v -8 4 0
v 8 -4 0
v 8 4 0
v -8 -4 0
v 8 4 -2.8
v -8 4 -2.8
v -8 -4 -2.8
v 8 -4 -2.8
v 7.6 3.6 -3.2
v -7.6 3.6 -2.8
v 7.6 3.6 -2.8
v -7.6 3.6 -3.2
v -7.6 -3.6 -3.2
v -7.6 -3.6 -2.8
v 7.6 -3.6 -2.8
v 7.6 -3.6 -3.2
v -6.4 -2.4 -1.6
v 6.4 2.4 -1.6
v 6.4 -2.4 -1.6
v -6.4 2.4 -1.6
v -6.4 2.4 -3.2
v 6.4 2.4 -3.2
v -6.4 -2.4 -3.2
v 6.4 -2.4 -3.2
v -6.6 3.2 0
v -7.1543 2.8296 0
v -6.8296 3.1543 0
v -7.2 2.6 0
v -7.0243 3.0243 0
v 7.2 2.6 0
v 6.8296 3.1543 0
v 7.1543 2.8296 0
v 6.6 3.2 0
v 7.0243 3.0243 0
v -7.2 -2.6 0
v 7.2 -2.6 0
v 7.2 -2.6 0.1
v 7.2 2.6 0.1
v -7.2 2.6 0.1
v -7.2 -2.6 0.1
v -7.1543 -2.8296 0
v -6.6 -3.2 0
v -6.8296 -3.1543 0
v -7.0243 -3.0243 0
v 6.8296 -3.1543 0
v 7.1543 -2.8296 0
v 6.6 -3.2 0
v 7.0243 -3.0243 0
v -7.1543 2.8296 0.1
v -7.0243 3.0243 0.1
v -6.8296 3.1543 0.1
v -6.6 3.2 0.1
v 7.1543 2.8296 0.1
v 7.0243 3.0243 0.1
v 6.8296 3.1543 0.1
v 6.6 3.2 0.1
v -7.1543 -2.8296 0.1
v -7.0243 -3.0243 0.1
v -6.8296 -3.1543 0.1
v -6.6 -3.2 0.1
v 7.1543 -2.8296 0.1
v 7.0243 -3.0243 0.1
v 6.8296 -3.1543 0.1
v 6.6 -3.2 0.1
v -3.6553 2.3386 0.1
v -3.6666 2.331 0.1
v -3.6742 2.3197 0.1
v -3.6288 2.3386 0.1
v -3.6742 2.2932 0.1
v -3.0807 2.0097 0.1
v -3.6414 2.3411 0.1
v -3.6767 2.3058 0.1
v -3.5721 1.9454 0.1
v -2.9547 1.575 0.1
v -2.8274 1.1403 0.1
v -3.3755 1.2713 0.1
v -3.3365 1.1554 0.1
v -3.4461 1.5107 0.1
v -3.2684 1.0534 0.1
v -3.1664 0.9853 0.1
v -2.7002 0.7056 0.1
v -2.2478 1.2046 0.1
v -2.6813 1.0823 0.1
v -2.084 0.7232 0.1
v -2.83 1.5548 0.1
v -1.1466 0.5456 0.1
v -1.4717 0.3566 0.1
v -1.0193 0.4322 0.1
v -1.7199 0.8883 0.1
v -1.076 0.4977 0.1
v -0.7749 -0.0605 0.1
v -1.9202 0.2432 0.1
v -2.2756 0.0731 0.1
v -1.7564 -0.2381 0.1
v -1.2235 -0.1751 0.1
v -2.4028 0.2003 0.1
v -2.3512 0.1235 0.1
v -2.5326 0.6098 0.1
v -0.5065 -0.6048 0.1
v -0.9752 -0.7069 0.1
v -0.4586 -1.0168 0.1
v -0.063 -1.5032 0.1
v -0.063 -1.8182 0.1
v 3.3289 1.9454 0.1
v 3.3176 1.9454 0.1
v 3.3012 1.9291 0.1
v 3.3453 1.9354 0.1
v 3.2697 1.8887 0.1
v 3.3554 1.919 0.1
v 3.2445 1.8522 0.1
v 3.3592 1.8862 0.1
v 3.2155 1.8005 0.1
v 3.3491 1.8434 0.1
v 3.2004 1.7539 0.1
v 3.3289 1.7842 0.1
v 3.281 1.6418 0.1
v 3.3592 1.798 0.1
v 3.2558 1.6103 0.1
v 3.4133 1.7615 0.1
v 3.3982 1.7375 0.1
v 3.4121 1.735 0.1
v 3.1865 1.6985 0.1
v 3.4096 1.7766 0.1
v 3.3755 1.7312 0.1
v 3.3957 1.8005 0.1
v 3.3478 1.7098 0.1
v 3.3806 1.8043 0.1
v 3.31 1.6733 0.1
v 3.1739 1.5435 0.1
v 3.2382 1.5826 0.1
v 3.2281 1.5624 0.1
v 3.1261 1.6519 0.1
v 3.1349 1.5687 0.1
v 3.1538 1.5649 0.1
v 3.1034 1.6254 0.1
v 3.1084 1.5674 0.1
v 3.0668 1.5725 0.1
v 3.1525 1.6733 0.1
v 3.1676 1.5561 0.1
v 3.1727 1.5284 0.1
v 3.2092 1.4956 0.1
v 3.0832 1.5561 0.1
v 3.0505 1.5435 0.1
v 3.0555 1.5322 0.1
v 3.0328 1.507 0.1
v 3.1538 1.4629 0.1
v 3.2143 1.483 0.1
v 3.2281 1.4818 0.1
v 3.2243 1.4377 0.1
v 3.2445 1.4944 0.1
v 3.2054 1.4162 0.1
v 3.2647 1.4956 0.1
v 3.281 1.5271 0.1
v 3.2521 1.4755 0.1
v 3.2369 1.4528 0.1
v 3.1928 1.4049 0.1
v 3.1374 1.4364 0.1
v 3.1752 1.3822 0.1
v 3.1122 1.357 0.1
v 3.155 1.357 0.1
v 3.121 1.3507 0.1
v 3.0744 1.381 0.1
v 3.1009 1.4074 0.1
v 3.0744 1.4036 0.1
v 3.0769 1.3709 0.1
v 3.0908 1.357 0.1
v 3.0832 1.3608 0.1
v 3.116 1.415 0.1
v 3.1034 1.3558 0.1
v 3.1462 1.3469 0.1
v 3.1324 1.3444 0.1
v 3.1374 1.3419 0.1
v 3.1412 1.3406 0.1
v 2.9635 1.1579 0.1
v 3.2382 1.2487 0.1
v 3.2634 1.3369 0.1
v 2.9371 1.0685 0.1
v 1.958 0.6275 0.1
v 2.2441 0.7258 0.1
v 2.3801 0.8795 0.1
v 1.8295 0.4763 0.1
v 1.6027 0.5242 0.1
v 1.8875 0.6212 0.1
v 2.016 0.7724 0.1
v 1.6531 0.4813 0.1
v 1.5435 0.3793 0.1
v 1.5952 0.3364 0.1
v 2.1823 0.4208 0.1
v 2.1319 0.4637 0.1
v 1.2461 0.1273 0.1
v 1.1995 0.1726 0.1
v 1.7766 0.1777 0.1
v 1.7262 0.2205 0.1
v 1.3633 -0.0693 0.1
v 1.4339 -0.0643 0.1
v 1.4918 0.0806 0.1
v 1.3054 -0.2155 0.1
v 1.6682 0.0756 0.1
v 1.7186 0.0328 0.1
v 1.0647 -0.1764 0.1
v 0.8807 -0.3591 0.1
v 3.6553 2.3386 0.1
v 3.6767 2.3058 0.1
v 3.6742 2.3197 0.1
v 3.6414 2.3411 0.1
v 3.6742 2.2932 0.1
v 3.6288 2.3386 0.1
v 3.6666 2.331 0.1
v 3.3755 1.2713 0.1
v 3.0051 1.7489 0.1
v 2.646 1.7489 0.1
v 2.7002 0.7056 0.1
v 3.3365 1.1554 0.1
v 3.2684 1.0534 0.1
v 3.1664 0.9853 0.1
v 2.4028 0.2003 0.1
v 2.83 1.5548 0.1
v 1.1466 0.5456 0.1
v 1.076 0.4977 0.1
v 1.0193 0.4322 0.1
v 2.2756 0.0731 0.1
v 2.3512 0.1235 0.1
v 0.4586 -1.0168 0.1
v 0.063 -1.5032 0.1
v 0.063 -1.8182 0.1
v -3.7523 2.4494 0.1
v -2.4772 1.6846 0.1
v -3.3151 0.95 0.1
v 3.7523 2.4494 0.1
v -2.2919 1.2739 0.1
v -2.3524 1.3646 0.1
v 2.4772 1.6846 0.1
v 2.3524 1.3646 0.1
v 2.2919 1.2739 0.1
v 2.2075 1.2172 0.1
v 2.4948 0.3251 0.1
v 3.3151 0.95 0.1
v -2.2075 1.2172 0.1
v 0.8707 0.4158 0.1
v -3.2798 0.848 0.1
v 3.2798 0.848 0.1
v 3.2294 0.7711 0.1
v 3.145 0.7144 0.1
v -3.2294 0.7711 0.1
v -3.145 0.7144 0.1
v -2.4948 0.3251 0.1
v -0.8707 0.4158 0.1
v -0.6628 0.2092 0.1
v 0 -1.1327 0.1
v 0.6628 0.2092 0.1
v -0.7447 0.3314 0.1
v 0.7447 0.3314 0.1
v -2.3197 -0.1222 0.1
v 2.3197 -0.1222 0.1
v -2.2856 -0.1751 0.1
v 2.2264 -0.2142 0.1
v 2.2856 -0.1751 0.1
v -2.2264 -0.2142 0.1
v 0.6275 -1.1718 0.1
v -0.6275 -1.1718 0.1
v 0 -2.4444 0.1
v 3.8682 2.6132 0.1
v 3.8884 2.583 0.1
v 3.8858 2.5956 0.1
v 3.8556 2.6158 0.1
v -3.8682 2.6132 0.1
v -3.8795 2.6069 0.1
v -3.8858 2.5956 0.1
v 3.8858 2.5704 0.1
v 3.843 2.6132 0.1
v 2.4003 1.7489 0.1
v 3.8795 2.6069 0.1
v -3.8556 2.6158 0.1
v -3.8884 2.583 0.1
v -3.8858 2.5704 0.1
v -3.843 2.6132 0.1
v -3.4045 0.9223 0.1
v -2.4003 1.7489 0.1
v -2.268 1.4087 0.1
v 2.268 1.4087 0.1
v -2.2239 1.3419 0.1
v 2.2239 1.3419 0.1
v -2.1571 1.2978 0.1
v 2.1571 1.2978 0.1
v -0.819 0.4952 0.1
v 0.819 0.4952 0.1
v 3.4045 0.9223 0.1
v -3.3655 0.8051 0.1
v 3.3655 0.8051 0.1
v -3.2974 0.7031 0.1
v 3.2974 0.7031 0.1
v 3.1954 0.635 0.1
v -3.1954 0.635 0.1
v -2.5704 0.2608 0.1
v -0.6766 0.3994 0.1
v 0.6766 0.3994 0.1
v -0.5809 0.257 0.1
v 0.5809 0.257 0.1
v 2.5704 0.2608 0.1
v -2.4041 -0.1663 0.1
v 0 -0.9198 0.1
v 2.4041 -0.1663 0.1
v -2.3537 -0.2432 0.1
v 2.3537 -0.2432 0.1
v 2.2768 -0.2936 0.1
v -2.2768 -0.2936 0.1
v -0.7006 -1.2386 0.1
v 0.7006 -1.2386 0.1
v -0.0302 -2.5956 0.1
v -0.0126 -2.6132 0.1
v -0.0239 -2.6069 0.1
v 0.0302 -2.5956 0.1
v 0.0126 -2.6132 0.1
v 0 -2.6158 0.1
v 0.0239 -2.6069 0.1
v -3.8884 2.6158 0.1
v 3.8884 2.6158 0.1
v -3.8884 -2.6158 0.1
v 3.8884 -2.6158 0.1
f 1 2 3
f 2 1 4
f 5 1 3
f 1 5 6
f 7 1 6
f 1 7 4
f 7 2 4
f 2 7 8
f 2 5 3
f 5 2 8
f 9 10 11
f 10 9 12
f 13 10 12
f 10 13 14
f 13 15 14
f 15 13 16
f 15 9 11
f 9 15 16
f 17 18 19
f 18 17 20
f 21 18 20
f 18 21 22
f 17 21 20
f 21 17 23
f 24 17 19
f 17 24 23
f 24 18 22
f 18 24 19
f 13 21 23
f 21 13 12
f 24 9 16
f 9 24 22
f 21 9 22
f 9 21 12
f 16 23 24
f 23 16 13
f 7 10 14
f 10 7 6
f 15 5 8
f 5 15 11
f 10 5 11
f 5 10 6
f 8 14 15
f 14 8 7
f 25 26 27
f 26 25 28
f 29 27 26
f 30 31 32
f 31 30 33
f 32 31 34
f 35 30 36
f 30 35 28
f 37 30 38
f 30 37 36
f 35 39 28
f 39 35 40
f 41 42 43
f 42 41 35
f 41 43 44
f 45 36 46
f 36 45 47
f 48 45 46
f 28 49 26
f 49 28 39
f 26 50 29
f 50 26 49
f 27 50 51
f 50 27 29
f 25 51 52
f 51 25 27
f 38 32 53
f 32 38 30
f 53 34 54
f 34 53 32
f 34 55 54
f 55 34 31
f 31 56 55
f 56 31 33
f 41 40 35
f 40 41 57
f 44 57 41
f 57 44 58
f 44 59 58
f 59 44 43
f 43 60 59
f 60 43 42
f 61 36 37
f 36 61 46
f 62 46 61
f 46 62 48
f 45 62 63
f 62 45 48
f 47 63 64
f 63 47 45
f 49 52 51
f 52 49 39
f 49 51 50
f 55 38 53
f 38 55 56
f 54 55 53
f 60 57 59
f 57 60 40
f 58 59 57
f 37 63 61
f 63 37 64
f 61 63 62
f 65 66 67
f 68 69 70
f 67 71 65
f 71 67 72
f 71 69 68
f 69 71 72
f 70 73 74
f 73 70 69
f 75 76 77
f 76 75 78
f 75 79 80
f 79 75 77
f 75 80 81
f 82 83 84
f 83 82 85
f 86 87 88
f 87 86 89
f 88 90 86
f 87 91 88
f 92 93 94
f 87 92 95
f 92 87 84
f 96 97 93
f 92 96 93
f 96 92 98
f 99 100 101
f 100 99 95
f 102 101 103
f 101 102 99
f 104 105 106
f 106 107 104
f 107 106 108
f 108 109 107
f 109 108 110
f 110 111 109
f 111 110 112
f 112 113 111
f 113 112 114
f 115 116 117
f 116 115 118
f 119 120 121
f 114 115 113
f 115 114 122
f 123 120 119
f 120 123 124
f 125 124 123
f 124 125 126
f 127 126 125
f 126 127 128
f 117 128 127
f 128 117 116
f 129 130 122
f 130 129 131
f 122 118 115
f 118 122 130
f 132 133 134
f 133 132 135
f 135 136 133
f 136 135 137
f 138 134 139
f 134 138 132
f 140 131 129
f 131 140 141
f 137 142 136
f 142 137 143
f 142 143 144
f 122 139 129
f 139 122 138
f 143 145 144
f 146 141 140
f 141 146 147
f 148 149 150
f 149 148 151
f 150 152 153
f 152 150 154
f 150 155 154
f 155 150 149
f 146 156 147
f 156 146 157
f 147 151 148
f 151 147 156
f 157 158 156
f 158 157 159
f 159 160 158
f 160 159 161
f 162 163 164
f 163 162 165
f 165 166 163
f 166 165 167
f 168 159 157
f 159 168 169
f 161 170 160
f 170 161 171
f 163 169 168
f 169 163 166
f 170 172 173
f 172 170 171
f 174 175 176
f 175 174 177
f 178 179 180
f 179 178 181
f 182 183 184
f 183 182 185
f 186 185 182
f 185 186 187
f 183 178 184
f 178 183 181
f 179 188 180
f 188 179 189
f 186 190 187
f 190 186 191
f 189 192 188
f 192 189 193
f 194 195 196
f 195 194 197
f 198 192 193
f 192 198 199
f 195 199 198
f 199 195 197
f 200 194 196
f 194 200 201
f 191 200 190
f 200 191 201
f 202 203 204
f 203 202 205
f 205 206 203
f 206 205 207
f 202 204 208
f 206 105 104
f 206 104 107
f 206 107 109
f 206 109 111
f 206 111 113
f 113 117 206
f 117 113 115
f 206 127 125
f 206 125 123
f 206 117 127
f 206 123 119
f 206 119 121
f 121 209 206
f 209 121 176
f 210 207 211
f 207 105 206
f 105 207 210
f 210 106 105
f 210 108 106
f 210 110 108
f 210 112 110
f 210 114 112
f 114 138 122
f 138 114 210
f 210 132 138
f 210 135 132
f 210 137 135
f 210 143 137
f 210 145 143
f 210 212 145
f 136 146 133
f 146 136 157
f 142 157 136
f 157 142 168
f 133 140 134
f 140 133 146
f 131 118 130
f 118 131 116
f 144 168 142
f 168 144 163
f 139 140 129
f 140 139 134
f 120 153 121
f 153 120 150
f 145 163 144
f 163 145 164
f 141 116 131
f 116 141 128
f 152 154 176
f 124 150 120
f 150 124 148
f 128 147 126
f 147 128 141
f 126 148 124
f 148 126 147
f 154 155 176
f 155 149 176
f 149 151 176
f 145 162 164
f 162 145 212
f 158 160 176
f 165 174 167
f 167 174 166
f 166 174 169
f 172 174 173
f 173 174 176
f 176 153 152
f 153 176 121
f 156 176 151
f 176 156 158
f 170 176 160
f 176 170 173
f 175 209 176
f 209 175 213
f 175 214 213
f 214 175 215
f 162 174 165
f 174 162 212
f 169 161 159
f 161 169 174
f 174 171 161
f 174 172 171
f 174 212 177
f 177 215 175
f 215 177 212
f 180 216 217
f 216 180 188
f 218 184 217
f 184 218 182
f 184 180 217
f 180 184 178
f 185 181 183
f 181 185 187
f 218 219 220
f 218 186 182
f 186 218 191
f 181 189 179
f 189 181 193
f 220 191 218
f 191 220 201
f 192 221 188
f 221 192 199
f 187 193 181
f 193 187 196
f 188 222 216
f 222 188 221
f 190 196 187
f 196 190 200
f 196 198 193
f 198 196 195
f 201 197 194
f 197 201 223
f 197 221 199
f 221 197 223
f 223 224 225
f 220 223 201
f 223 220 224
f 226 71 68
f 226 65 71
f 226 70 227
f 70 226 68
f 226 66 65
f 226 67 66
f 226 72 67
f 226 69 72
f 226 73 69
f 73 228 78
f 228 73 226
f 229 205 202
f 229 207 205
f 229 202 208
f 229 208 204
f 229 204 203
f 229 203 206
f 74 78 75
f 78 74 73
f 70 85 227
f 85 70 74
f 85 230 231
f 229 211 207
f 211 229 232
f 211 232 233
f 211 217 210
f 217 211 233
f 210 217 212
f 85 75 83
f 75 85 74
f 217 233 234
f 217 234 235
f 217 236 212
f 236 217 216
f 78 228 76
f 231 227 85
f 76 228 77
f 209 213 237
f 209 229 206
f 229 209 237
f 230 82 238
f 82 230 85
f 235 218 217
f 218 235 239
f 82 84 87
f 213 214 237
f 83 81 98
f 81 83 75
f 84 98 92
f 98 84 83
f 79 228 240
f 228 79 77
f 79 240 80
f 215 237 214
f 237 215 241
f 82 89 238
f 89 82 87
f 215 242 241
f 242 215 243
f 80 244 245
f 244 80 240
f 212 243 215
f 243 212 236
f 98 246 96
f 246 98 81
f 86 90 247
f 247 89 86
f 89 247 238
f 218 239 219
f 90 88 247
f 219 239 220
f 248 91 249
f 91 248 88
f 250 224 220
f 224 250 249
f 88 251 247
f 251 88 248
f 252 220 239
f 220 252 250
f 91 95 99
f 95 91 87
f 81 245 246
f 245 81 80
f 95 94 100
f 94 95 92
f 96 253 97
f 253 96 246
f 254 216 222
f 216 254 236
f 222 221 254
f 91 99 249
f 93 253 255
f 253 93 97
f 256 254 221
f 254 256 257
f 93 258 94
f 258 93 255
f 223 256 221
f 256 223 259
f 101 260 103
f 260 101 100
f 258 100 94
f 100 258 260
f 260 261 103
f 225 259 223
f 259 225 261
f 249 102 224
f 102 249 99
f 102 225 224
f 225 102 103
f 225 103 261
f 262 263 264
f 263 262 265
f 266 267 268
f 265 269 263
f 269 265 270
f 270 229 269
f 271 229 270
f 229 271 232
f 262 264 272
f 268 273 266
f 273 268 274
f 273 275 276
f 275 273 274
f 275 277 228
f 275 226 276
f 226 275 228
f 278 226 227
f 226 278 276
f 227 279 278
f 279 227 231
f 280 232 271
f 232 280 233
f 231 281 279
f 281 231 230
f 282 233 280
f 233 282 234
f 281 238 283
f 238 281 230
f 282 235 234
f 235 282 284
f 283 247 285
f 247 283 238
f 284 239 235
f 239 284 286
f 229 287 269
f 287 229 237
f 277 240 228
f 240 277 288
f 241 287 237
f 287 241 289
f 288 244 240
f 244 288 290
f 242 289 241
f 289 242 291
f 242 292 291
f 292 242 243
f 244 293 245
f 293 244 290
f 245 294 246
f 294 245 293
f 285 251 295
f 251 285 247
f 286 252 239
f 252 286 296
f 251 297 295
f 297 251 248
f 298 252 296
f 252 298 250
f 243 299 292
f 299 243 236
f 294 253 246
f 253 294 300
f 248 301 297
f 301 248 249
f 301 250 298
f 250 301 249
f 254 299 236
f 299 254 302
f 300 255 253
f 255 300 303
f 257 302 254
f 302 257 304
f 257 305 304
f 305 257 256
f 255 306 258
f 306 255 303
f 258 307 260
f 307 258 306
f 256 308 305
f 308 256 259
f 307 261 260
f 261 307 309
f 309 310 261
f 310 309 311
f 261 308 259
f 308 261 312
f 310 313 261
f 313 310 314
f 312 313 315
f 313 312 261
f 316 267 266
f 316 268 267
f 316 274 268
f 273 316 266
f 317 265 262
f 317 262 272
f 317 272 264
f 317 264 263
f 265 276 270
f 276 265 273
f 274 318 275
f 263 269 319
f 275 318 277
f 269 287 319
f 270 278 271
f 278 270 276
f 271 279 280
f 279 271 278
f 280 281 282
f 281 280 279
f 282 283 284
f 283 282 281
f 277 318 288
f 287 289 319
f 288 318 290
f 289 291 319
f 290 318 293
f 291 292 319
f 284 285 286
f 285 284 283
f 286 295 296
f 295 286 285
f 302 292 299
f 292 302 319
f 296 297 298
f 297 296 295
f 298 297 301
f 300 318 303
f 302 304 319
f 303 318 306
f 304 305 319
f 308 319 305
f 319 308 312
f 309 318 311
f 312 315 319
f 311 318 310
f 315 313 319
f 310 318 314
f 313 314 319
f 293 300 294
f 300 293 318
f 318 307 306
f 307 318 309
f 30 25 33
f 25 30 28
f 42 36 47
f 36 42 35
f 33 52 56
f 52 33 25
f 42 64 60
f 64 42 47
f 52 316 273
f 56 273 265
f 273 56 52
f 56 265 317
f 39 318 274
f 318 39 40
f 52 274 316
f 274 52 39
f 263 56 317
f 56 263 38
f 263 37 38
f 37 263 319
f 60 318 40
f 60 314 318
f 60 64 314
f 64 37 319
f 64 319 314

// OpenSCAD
use <../lib.scad>
use <3069b.scad>
use <6142622e.scad>
function ldraw_lib__3069bd2s() = [
// 0 Tile  1 x  2 with Chevrolet Corvette Z06-C7 Logo on Yellow Background Sticker
// 0 Name: 3069bd2s.dat
// 0 Author: Alfred Schmitz [AlfredS]
// 0 !LDRAW_ORG Shortcut UPDATE 2026-08
// 0 !LICENSE Licensed under CC BY 4.0 : see CAreadme.txt
// 
// 0 BFC CERTIFY CCW
  [0,"BFC","CERTIFY"],
  [0,"BFC","CCW"],
// 
// 0 !CATEGORY Sticker Shortcut
// 0 !KEYWORDS Chevrolet, Corvette, Set 75870, Speed Champions, Z06
// 
// 0 !HISTORY 2026-08-31 [OrionP] Official Update 2026-08
// 
// 1 16 0 0 0 1 0 0 0 1 0 0 0 1 3069b.dat
  [1,16,0,0,0,1,0,0,0,1,0,0,0,1, ldraw_lib__3069b()],
// 1 16 0 0 0 1 0 0 0 1 0 0 0 1 6142622e.dat
  [1,16,0,0,0,1,0,0,0,1,0,0,0,1, ldraw_lib__6142622e()],
];
module ldraw_lib__3069bd2s(step=0, col=false, unit=2/5, alt=false, line=0.2, solid=!$preview)
    makepoly(ldraw_lib__3069bd2s(), step=step, col=col, unit=unit, alt=alt, line=line, solid=solid);
ldraw_lib__3069bd2s(line=0.2);
